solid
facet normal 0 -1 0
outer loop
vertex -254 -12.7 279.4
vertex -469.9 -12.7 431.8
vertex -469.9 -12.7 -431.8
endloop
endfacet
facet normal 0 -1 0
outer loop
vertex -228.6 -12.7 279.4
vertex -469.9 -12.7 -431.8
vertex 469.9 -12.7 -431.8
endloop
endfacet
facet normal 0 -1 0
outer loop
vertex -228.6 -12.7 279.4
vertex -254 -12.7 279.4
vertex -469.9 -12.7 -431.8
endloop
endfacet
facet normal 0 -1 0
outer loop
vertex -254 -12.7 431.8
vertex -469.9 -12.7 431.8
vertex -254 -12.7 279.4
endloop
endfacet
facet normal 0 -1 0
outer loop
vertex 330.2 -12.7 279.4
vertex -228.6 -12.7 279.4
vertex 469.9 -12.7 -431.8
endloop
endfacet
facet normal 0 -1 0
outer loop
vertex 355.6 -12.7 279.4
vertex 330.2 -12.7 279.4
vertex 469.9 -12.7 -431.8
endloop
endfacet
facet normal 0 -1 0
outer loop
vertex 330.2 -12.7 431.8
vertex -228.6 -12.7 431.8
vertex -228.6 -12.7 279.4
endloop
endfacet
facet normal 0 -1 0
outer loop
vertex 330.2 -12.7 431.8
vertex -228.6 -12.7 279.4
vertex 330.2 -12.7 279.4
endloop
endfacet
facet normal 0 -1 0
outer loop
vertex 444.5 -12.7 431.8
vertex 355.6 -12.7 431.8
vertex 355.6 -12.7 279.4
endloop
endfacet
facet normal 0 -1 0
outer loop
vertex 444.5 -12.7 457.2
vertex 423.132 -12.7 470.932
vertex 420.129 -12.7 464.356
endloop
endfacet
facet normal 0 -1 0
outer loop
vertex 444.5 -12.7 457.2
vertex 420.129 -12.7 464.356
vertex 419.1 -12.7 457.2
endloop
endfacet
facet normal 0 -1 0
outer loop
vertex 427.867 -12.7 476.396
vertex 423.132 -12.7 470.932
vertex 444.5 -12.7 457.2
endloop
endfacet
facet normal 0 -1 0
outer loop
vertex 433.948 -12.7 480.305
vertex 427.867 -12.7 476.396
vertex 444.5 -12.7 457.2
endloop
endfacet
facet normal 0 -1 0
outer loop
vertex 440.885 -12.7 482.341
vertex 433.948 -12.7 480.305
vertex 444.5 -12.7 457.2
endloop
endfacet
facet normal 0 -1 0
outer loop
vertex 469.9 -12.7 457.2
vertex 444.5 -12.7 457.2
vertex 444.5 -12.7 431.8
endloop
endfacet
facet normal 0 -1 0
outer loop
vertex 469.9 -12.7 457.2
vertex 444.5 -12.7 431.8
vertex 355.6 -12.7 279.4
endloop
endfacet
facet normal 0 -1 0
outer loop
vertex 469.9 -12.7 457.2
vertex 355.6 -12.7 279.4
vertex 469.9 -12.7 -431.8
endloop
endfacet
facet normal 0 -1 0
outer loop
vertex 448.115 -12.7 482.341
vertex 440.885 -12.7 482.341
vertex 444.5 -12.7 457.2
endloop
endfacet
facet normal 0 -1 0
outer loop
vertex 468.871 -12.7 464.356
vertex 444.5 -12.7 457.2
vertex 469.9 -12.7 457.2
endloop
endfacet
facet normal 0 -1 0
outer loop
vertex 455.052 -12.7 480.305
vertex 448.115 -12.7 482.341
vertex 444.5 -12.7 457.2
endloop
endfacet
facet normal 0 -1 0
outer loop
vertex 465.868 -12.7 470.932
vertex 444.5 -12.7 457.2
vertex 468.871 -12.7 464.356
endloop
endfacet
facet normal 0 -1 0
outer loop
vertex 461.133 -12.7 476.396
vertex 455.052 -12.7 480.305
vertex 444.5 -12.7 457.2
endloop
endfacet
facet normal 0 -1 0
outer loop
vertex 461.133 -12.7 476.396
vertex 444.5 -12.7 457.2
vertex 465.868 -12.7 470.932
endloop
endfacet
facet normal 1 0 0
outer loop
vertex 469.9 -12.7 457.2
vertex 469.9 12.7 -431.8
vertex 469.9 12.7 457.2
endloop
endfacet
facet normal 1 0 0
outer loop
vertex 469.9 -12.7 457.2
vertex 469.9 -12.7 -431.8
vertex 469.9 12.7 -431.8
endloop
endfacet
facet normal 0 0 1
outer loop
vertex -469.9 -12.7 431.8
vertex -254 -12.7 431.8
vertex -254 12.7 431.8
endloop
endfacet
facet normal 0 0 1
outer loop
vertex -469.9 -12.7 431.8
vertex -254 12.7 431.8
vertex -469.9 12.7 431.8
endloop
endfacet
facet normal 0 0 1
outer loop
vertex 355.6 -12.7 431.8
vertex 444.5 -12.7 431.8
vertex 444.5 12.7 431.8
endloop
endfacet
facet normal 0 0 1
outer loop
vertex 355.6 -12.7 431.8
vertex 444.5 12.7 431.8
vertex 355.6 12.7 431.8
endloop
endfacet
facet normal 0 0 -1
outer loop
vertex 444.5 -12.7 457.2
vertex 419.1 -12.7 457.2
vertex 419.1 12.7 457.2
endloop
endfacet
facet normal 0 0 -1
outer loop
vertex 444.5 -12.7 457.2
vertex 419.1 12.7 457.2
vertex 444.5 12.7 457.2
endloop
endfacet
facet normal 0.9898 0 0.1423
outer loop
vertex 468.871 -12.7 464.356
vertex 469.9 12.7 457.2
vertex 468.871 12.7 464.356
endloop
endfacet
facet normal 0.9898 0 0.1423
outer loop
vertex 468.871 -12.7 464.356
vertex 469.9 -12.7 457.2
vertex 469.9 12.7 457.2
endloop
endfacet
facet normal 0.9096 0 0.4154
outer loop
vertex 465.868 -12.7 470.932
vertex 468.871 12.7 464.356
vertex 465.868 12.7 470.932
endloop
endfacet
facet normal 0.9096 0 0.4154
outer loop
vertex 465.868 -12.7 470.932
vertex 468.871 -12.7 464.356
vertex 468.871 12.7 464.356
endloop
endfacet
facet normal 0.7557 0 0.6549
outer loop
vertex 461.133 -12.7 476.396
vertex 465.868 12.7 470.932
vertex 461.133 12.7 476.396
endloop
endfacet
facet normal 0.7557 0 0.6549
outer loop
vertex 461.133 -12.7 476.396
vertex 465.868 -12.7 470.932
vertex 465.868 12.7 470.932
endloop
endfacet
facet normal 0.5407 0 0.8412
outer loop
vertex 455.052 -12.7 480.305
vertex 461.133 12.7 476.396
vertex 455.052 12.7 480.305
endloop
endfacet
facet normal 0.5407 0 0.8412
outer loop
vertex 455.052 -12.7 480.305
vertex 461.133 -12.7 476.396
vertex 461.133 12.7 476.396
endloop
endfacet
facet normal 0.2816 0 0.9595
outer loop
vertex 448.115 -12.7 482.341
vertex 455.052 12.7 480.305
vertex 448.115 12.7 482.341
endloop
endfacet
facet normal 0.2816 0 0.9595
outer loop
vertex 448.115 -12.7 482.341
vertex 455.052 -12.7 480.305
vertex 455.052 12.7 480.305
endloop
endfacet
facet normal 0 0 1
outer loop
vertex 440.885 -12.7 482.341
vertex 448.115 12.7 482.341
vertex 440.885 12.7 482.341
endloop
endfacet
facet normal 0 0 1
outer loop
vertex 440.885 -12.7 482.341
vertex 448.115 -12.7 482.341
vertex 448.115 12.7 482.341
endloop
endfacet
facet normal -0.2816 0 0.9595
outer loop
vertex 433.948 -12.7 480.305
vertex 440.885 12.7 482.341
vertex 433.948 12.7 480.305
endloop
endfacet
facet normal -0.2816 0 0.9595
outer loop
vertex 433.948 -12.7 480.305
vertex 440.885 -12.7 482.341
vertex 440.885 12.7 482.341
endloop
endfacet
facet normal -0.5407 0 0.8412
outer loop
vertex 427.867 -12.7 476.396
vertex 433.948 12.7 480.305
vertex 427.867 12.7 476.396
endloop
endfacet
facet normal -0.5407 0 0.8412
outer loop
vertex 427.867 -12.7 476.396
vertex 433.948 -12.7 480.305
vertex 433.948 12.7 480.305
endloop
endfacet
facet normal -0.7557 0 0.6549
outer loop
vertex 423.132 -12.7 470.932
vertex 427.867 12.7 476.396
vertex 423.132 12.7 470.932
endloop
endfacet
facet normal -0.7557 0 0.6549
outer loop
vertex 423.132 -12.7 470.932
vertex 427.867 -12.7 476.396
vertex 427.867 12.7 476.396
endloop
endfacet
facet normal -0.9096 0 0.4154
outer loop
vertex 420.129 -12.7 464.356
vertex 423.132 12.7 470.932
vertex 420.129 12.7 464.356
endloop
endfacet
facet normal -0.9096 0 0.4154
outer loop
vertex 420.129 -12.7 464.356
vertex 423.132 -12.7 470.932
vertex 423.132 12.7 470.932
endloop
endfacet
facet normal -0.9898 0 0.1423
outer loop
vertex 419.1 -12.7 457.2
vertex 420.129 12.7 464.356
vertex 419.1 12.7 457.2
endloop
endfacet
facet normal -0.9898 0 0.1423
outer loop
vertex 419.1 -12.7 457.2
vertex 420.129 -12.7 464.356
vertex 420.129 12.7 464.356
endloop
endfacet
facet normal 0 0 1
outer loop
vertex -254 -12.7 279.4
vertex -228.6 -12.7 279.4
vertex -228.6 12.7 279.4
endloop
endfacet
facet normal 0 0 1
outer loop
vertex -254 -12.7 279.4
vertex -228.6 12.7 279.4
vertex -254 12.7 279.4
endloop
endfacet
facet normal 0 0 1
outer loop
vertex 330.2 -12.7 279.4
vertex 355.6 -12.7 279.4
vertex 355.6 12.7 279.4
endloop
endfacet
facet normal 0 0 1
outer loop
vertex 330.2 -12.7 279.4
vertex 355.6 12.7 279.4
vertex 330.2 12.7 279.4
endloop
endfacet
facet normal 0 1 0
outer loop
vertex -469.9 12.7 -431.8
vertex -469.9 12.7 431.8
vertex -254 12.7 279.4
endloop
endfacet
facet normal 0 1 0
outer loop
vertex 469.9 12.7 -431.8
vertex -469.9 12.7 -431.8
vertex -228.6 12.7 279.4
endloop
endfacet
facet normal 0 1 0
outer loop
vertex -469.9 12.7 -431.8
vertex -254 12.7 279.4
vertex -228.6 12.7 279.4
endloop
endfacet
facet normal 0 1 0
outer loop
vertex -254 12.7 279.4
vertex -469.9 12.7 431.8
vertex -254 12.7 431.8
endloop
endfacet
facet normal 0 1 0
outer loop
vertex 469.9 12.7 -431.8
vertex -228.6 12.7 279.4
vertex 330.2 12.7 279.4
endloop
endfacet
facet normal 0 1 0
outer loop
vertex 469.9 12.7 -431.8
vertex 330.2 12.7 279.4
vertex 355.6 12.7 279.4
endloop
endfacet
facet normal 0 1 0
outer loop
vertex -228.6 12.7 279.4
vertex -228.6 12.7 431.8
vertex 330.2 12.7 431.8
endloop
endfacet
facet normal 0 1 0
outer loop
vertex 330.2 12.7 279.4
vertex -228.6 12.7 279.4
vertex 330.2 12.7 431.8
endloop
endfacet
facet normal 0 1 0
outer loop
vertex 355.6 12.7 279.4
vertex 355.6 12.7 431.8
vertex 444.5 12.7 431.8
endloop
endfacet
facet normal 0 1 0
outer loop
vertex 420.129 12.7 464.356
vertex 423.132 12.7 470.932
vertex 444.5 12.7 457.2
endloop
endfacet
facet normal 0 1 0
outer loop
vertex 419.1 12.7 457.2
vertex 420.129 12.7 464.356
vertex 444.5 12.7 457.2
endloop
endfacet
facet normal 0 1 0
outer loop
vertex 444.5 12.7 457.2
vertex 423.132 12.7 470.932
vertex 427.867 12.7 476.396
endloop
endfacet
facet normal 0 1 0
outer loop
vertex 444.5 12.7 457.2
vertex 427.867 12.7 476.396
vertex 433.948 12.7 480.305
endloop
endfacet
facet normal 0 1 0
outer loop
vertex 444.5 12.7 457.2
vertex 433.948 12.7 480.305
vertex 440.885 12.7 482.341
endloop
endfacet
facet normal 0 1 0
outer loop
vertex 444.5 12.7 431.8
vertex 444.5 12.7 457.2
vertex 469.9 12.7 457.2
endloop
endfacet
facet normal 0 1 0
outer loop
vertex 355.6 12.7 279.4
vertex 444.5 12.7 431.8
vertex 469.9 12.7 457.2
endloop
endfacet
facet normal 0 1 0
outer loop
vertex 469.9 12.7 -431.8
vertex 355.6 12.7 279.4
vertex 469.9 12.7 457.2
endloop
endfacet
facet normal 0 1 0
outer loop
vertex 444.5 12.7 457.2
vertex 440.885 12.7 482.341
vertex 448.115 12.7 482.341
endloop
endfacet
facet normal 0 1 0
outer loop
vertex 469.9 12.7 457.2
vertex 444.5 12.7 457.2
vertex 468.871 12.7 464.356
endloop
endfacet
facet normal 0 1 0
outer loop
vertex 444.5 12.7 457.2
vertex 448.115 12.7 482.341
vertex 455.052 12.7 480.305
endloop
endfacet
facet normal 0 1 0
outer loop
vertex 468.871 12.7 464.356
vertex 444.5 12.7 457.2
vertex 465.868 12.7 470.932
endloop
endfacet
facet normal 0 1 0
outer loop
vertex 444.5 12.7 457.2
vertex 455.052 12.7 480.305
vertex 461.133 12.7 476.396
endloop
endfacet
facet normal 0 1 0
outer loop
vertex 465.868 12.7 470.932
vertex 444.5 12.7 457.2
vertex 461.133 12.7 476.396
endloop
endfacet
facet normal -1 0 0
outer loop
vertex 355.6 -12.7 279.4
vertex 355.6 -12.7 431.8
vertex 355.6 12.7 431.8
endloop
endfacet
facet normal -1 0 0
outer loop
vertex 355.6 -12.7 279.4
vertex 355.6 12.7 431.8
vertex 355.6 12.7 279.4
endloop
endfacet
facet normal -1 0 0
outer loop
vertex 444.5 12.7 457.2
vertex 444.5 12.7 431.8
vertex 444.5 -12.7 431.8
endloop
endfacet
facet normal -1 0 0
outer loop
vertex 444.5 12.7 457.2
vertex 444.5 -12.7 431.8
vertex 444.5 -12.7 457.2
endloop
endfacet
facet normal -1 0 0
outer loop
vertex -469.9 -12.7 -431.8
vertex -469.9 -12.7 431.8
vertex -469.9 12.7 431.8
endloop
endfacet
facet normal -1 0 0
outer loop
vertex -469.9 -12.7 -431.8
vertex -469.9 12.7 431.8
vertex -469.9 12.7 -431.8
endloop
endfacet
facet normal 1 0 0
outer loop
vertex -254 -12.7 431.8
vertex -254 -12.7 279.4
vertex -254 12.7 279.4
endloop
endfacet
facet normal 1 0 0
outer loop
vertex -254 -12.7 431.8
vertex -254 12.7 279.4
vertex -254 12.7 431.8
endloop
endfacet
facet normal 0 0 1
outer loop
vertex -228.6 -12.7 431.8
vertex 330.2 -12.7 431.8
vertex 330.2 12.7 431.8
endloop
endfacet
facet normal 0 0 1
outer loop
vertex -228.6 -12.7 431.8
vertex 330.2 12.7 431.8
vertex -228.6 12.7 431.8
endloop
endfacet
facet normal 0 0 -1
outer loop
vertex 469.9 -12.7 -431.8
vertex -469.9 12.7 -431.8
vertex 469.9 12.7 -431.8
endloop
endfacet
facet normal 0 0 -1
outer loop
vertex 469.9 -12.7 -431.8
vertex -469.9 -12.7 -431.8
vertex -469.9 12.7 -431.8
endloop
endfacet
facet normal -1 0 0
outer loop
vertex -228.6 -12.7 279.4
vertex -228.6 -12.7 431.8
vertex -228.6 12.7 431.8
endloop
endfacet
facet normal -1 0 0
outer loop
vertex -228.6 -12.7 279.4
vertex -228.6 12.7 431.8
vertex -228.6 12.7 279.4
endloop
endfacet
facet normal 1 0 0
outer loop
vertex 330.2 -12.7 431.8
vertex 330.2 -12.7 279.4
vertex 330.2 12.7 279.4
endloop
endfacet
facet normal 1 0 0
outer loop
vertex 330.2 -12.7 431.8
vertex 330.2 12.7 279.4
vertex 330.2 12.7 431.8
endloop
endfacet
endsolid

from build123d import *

# Parameters (mm, degrees)
F0_W     = 25.4
F0_H     = 25.4
F1_DEPTH = 12.7


with BuildPart() as f1:
    # F0 (on Front) → F1 (new body, symmetric)
    with BuildSketch(Plane.XZ):
        with BuildLine():
            Line((444.5, 457.2), (469.9, 457.2))
            ThreePointArc((469.9, 457.2), (444.5, 482.6), (419.1, 457.2))
            Line((419.1, 457.2), (444.5, 457.2))
        make_face()
        with Locations((457.2, 444.5)):
            Rectangle(F0_W, F0_H)
        Polygon((469.9, -431.8), (469.9, 431.8), (444.5, 431.8), (355.6, 431.8), (355.6, 279.4), (330.2, 279.4), (330.2, 431.8), (-228.6, 431.8), (-228.6, 279.4), (-254, 279.4), (-254, 431.8), (-469.9, 431.8), (-469.9, -431.8), align=None)
    extrude(amount=F1_DEPTH, both=True)


solid = f1.part
